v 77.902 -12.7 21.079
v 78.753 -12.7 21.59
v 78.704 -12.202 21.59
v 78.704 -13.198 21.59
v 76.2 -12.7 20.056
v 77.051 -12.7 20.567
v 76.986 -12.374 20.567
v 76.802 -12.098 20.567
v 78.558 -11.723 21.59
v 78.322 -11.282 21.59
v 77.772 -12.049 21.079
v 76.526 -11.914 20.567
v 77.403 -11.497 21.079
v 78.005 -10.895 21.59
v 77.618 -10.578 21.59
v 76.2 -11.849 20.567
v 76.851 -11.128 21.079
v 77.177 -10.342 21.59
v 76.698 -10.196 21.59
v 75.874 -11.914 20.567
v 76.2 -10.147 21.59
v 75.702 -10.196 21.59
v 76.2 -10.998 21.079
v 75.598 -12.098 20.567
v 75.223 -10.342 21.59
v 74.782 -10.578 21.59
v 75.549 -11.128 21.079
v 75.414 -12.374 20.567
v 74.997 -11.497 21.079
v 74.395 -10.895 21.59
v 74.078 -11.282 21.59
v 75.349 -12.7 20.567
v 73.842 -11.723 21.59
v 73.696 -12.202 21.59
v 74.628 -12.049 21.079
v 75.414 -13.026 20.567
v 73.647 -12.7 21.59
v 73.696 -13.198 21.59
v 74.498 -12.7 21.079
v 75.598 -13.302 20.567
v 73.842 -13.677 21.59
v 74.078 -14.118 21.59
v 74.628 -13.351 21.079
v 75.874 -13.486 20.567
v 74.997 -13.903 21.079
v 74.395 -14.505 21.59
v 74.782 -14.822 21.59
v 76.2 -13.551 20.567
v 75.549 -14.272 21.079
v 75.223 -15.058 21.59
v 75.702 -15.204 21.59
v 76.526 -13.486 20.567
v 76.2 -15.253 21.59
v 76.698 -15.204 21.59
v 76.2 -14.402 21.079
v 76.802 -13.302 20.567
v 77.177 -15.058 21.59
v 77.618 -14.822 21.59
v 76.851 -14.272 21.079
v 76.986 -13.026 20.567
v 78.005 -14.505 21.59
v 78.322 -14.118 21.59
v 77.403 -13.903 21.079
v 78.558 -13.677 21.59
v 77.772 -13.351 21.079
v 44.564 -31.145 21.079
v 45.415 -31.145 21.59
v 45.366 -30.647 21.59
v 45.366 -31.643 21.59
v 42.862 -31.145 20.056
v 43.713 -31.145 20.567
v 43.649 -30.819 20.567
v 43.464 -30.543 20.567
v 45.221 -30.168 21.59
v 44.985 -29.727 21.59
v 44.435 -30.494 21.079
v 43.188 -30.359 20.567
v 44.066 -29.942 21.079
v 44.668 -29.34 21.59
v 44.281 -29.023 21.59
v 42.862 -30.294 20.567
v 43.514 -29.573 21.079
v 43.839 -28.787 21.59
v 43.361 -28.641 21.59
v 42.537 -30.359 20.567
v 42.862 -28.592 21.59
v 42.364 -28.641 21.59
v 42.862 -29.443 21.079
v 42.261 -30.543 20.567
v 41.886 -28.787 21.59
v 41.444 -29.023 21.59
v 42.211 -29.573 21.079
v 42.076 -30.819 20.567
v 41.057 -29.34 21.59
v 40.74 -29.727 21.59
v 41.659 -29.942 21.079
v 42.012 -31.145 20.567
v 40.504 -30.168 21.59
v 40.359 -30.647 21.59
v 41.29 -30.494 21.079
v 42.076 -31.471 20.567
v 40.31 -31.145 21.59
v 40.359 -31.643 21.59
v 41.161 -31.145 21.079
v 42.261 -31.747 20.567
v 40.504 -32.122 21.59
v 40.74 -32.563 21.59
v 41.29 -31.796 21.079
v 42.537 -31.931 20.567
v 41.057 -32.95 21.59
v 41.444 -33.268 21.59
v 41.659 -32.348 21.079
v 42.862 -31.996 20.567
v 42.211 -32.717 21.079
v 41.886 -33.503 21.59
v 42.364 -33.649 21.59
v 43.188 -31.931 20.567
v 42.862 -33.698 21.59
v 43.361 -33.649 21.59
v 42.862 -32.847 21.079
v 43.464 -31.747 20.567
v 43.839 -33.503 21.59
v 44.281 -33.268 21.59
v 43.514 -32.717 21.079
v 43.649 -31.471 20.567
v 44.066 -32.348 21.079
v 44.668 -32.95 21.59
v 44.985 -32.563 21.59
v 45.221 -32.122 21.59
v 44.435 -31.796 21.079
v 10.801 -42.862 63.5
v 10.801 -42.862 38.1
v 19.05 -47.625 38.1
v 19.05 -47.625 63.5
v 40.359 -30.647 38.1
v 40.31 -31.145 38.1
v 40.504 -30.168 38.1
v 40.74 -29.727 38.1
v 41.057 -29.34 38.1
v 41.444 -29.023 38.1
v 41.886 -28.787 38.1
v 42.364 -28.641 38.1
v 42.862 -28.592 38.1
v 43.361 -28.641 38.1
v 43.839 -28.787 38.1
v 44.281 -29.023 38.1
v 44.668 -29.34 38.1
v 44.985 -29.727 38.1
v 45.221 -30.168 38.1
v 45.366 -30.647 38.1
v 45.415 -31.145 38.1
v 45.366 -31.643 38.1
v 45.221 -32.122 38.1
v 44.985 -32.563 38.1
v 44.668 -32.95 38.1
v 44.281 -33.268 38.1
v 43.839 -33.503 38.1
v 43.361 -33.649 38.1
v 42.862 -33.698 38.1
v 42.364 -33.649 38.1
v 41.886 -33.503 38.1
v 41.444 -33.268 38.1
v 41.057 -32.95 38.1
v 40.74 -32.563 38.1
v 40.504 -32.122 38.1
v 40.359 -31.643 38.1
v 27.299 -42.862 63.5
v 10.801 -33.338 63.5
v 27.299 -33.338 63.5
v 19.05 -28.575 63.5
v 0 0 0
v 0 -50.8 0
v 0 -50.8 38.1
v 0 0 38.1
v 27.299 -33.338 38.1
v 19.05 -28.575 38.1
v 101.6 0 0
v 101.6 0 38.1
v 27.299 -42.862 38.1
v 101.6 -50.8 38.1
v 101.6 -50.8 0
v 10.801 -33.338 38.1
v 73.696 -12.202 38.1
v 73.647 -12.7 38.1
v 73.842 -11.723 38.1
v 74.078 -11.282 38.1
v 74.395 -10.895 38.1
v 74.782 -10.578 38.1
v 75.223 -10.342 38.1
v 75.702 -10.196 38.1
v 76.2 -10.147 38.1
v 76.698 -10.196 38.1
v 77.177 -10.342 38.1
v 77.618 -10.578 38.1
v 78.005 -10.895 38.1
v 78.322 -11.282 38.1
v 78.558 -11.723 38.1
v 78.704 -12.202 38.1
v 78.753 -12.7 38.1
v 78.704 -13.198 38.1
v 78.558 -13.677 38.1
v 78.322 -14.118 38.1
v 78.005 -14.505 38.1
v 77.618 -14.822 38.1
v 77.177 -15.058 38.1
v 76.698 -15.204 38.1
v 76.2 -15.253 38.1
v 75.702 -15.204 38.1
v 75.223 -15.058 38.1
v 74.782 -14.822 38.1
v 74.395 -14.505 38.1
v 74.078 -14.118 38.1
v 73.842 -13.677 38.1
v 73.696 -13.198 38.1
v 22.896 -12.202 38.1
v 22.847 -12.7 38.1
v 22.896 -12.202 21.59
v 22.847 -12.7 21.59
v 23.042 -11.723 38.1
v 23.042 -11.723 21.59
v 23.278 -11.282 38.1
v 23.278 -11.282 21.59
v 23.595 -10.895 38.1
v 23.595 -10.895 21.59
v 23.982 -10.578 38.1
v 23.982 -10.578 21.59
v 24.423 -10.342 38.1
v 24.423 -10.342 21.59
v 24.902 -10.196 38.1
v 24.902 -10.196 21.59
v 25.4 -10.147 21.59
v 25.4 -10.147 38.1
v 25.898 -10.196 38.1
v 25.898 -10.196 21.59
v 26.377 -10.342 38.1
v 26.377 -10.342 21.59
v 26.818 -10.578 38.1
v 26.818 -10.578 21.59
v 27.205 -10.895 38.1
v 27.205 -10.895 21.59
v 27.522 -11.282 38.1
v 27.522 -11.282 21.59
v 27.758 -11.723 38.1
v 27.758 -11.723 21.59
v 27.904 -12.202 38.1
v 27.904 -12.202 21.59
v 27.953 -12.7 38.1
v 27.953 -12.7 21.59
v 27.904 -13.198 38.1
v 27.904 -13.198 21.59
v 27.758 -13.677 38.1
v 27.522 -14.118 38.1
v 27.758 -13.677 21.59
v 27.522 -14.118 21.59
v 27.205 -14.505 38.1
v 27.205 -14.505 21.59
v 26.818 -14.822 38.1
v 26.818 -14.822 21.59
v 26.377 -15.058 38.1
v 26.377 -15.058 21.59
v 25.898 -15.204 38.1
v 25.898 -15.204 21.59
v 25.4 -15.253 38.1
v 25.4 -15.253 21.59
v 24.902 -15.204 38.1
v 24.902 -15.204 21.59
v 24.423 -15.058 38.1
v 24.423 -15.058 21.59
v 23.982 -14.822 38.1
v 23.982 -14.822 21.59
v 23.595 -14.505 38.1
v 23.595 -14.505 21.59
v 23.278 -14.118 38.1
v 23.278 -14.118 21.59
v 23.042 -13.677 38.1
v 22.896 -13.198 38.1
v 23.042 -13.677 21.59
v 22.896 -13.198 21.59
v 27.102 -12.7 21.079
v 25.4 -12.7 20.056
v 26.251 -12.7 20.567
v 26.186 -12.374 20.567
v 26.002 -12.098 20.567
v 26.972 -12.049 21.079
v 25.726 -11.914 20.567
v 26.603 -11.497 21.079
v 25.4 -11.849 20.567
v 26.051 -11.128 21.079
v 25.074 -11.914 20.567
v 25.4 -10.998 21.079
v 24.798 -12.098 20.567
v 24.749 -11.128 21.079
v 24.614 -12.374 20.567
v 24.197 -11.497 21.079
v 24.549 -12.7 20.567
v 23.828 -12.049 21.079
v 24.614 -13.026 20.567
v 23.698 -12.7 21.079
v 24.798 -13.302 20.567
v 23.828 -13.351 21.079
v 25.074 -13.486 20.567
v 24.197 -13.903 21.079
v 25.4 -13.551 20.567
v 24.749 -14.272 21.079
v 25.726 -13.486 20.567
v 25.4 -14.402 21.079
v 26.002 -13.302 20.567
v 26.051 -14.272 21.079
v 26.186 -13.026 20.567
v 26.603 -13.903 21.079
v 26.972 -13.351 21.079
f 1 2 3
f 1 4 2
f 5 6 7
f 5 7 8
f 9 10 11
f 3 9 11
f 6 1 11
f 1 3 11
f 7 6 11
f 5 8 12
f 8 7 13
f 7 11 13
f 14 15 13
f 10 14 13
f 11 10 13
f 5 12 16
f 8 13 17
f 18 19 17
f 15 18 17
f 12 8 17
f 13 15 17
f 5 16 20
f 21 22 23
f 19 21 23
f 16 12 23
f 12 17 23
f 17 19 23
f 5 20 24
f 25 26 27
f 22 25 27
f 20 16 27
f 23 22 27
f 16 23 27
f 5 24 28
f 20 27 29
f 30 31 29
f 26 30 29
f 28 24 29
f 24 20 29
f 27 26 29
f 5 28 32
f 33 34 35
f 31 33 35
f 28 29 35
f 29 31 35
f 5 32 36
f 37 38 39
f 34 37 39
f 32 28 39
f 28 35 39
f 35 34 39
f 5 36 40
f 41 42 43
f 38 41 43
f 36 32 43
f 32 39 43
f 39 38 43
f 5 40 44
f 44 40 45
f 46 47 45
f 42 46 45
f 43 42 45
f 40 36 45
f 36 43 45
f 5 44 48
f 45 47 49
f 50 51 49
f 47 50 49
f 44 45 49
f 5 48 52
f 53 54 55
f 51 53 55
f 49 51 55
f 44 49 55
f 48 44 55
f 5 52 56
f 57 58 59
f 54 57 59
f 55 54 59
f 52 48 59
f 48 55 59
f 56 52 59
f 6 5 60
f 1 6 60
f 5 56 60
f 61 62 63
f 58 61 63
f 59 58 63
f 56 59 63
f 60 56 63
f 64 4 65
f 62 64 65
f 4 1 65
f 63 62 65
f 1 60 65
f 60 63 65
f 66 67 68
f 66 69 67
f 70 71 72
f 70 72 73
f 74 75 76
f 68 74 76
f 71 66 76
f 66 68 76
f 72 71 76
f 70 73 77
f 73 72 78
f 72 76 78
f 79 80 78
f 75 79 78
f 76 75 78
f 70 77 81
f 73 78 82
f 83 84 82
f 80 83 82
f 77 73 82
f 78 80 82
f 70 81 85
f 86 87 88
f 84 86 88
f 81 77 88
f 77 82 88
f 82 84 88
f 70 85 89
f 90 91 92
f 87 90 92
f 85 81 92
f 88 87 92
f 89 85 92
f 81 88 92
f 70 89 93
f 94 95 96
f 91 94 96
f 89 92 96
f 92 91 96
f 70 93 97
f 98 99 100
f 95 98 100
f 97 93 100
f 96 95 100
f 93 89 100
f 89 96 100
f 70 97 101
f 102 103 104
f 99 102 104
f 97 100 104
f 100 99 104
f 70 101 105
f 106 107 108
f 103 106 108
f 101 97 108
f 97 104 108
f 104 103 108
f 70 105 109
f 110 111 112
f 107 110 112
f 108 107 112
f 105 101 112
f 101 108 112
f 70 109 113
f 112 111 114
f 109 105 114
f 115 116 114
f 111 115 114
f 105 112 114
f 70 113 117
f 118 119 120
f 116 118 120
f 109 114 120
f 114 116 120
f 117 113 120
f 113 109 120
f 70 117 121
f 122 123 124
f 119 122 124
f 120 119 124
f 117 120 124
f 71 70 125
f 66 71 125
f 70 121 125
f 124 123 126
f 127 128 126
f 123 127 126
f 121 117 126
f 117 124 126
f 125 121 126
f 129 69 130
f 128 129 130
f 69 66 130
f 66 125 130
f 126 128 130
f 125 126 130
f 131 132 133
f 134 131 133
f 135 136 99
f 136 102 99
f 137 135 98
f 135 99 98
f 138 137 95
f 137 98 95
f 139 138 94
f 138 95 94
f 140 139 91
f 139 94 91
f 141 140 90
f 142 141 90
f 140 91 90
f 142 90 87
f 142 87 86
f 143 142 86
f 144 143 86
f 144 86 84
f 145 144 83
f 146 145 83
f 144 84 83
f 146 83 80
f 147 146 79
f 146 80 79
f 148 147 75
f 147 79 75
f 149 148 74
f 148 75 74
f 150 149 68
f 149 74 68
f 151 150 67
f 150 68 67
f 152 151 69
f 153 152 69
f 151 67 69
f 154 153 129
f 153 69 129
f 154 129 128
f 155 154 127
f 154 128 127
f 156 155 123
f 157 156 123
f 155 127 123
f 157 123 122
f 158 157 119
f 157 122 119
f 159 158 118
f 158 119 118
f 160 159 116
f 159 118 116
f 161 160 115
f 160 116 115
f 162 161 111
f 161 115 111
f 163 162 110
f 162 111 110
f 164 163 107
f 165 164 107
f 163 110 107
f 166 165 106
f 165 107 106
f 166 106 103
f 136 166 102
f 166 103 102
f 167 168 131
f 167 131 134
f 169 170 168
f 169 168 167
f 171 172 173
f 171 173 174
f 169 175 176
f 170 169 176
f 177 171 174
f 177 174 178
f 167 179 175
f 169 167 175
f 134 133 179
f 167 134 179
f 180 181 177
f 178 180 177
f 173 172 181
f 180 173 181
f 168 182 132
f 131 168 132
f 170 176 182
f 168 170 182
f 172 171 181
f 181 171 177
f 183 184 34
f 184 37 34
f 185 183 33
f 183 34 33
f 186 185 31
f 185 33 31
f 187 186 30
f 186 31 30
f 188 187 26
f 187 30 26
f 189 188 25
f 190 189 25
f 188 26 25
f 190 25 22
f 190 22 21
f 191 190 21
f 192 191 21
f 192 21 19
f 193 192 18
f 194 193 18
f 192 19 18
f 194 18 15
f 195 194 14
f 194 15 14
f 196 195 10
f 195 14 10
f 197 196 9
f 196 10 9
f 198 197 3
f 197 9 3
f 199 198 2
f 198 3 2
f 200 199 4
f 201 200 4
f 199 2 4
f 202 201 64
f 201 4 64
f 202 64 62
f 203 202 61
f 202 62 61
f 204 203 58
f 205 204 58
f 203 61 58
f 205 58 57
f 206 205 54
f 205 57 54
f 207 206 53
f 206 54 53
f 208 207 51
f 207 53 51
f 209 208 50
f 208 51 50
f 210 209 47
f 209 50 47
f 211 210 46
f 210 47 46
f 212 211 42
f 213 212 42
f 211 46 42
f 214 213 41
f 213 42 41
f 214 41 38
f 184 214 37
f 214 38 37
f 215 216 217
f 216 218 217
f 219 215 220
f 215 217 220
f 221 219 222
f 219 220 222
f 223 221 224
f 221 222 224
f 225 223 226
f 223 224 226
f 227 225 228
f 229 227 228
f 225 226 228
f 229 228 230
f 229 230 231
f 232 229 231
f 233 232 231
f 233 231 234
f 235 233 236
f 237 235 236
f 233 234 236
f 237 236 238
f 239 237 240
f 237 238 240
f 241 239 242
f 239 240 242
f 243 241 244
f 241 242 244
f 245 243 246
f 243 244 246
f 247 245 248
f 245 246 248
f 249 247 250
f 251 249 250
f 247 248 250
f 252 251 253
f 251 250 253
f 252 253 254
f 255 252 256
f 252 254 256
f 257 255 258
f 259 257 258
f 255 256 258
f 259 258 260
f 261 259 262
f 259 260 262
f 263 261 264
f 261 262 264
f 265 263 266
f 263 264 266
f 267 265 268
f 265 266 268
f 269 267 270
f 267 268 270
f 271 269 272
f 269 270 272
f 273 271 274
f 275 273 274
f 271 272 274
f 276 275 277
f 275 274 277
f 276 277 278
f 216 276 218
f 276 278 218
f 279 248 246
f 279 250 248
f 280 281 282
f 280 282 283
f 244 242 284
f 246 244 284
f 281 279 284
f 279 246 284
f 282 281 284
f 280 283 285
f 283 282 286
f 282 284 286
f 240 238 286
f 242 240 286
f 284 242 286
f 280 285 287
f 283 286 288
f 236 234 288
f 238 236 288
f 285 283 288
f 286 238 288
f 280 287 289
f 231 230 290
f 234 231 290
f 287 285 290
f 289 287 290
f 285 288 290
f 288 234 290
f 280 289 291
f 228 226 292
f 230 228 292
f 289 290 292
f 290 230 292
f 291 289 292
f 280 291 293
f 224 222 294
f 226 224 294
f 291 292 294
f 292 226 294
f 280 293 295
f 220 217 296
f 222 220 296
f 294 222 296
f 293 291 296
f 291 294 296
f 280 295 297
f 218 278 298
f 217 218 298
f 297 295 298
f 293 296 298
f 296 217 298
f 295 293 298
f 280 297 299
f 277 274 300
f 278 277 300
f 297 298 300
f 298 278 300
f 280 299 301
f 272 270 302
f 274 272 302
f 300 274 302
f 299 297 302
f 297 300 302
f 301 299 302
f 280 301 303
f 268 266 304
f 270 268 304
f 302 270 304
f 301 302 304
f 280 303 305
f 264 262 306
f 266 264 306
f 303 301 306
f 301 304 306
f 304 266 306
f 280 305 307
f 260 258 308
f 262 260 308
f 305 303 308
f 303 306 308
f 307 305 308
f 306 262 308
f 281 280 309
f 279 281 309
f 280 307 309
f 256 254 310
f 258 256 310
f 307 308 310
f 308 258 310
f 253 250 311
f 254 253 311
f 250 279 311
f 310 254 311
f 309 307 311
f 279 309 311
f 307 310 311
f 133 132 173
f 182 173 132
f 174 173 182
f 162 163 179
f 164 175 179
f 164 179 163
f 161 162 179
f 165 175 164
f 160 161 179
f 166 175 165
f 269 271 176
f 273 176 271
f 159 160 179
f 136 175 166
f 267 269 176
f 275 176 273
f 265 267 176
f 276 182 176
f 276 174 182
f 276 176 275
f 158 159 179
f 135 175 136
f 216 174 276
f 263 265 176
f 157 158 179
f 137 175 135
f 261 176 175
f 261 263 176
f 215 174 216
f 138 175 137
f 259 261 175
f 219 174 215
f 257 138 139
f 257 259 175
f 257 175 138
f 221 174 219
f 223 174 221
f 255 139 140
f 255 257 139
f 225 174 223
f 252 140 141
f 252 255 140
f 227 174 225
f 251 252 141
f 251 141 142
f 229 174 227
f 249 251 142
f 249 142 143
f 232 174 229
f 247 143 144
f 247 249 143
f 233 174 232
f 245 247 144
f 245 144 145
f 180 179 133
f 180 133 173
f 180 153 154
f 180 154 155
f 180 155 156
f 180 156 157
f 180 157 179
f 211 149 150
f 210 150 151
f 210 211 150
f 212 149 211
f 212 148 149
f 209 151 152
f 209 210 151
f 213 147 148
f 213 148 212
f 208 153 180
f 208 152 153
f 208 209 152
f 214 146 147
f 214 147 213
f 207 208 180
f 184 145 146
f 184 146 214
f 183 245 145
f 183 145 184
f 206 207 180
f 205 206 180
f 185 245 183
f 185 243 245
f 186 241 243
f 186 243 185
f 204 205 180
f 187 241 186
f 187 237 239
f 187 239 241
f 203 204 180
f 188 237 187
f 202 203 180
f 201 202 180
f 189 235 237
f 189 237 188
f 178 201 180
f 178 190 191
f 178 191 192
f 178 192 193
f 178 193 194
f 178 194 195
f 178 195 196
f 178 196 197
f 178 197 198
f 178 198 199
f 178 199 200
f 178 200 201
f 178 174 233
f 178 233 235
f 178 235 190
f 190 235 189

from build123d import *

# Parameters (mm, degrees)
F0_W     = 101.6
F0_H     = 50.8
F1_DEPTH = 38.1
F3_D     = 5.1054
F3_DEPTH = 16.51
F3_TIP   = 1.5338169022
F5_DEPTH = 25.4


with BuildPart() as f1:
    # F0 (on Top) → F1 (new body)
    with BuildSketch(Plane.XY):
        with Locations((50.8, -25.4)):
            Rectangle(F0_W, F0_H)
    extrude(amount=F1_DEPTH)

    # F3
    with Locations(Plane.XY.offset(38.1)):
        with Locations((25.4, -12.7), (42.8625, -31.1450831863), (76.2, -12.7)):
            Hole(F3_D / 2, depth=F3_DEPTH)
            with Locations((0, 0, -(F3_DEPTH + F3_TIP / 2))):  # 118° drill point
                Cone(0, F3_D / 2, F3_TIP, mode=Mode.SUBTRACT)

    # F4 (on face) → F5 (join)
    with BuildSketch(Plane.XY.offset(38.1)):
        Polygon((19.05, -47.625), (27.298891971, -42.8625), (27.298891971, -33.3375), (19.05, -28.575), (10.801108029, -33.3375), (10.801108029, -42.8625), align=None)
    extrude(amount=F5_DEPTH)


solid = f1.part
